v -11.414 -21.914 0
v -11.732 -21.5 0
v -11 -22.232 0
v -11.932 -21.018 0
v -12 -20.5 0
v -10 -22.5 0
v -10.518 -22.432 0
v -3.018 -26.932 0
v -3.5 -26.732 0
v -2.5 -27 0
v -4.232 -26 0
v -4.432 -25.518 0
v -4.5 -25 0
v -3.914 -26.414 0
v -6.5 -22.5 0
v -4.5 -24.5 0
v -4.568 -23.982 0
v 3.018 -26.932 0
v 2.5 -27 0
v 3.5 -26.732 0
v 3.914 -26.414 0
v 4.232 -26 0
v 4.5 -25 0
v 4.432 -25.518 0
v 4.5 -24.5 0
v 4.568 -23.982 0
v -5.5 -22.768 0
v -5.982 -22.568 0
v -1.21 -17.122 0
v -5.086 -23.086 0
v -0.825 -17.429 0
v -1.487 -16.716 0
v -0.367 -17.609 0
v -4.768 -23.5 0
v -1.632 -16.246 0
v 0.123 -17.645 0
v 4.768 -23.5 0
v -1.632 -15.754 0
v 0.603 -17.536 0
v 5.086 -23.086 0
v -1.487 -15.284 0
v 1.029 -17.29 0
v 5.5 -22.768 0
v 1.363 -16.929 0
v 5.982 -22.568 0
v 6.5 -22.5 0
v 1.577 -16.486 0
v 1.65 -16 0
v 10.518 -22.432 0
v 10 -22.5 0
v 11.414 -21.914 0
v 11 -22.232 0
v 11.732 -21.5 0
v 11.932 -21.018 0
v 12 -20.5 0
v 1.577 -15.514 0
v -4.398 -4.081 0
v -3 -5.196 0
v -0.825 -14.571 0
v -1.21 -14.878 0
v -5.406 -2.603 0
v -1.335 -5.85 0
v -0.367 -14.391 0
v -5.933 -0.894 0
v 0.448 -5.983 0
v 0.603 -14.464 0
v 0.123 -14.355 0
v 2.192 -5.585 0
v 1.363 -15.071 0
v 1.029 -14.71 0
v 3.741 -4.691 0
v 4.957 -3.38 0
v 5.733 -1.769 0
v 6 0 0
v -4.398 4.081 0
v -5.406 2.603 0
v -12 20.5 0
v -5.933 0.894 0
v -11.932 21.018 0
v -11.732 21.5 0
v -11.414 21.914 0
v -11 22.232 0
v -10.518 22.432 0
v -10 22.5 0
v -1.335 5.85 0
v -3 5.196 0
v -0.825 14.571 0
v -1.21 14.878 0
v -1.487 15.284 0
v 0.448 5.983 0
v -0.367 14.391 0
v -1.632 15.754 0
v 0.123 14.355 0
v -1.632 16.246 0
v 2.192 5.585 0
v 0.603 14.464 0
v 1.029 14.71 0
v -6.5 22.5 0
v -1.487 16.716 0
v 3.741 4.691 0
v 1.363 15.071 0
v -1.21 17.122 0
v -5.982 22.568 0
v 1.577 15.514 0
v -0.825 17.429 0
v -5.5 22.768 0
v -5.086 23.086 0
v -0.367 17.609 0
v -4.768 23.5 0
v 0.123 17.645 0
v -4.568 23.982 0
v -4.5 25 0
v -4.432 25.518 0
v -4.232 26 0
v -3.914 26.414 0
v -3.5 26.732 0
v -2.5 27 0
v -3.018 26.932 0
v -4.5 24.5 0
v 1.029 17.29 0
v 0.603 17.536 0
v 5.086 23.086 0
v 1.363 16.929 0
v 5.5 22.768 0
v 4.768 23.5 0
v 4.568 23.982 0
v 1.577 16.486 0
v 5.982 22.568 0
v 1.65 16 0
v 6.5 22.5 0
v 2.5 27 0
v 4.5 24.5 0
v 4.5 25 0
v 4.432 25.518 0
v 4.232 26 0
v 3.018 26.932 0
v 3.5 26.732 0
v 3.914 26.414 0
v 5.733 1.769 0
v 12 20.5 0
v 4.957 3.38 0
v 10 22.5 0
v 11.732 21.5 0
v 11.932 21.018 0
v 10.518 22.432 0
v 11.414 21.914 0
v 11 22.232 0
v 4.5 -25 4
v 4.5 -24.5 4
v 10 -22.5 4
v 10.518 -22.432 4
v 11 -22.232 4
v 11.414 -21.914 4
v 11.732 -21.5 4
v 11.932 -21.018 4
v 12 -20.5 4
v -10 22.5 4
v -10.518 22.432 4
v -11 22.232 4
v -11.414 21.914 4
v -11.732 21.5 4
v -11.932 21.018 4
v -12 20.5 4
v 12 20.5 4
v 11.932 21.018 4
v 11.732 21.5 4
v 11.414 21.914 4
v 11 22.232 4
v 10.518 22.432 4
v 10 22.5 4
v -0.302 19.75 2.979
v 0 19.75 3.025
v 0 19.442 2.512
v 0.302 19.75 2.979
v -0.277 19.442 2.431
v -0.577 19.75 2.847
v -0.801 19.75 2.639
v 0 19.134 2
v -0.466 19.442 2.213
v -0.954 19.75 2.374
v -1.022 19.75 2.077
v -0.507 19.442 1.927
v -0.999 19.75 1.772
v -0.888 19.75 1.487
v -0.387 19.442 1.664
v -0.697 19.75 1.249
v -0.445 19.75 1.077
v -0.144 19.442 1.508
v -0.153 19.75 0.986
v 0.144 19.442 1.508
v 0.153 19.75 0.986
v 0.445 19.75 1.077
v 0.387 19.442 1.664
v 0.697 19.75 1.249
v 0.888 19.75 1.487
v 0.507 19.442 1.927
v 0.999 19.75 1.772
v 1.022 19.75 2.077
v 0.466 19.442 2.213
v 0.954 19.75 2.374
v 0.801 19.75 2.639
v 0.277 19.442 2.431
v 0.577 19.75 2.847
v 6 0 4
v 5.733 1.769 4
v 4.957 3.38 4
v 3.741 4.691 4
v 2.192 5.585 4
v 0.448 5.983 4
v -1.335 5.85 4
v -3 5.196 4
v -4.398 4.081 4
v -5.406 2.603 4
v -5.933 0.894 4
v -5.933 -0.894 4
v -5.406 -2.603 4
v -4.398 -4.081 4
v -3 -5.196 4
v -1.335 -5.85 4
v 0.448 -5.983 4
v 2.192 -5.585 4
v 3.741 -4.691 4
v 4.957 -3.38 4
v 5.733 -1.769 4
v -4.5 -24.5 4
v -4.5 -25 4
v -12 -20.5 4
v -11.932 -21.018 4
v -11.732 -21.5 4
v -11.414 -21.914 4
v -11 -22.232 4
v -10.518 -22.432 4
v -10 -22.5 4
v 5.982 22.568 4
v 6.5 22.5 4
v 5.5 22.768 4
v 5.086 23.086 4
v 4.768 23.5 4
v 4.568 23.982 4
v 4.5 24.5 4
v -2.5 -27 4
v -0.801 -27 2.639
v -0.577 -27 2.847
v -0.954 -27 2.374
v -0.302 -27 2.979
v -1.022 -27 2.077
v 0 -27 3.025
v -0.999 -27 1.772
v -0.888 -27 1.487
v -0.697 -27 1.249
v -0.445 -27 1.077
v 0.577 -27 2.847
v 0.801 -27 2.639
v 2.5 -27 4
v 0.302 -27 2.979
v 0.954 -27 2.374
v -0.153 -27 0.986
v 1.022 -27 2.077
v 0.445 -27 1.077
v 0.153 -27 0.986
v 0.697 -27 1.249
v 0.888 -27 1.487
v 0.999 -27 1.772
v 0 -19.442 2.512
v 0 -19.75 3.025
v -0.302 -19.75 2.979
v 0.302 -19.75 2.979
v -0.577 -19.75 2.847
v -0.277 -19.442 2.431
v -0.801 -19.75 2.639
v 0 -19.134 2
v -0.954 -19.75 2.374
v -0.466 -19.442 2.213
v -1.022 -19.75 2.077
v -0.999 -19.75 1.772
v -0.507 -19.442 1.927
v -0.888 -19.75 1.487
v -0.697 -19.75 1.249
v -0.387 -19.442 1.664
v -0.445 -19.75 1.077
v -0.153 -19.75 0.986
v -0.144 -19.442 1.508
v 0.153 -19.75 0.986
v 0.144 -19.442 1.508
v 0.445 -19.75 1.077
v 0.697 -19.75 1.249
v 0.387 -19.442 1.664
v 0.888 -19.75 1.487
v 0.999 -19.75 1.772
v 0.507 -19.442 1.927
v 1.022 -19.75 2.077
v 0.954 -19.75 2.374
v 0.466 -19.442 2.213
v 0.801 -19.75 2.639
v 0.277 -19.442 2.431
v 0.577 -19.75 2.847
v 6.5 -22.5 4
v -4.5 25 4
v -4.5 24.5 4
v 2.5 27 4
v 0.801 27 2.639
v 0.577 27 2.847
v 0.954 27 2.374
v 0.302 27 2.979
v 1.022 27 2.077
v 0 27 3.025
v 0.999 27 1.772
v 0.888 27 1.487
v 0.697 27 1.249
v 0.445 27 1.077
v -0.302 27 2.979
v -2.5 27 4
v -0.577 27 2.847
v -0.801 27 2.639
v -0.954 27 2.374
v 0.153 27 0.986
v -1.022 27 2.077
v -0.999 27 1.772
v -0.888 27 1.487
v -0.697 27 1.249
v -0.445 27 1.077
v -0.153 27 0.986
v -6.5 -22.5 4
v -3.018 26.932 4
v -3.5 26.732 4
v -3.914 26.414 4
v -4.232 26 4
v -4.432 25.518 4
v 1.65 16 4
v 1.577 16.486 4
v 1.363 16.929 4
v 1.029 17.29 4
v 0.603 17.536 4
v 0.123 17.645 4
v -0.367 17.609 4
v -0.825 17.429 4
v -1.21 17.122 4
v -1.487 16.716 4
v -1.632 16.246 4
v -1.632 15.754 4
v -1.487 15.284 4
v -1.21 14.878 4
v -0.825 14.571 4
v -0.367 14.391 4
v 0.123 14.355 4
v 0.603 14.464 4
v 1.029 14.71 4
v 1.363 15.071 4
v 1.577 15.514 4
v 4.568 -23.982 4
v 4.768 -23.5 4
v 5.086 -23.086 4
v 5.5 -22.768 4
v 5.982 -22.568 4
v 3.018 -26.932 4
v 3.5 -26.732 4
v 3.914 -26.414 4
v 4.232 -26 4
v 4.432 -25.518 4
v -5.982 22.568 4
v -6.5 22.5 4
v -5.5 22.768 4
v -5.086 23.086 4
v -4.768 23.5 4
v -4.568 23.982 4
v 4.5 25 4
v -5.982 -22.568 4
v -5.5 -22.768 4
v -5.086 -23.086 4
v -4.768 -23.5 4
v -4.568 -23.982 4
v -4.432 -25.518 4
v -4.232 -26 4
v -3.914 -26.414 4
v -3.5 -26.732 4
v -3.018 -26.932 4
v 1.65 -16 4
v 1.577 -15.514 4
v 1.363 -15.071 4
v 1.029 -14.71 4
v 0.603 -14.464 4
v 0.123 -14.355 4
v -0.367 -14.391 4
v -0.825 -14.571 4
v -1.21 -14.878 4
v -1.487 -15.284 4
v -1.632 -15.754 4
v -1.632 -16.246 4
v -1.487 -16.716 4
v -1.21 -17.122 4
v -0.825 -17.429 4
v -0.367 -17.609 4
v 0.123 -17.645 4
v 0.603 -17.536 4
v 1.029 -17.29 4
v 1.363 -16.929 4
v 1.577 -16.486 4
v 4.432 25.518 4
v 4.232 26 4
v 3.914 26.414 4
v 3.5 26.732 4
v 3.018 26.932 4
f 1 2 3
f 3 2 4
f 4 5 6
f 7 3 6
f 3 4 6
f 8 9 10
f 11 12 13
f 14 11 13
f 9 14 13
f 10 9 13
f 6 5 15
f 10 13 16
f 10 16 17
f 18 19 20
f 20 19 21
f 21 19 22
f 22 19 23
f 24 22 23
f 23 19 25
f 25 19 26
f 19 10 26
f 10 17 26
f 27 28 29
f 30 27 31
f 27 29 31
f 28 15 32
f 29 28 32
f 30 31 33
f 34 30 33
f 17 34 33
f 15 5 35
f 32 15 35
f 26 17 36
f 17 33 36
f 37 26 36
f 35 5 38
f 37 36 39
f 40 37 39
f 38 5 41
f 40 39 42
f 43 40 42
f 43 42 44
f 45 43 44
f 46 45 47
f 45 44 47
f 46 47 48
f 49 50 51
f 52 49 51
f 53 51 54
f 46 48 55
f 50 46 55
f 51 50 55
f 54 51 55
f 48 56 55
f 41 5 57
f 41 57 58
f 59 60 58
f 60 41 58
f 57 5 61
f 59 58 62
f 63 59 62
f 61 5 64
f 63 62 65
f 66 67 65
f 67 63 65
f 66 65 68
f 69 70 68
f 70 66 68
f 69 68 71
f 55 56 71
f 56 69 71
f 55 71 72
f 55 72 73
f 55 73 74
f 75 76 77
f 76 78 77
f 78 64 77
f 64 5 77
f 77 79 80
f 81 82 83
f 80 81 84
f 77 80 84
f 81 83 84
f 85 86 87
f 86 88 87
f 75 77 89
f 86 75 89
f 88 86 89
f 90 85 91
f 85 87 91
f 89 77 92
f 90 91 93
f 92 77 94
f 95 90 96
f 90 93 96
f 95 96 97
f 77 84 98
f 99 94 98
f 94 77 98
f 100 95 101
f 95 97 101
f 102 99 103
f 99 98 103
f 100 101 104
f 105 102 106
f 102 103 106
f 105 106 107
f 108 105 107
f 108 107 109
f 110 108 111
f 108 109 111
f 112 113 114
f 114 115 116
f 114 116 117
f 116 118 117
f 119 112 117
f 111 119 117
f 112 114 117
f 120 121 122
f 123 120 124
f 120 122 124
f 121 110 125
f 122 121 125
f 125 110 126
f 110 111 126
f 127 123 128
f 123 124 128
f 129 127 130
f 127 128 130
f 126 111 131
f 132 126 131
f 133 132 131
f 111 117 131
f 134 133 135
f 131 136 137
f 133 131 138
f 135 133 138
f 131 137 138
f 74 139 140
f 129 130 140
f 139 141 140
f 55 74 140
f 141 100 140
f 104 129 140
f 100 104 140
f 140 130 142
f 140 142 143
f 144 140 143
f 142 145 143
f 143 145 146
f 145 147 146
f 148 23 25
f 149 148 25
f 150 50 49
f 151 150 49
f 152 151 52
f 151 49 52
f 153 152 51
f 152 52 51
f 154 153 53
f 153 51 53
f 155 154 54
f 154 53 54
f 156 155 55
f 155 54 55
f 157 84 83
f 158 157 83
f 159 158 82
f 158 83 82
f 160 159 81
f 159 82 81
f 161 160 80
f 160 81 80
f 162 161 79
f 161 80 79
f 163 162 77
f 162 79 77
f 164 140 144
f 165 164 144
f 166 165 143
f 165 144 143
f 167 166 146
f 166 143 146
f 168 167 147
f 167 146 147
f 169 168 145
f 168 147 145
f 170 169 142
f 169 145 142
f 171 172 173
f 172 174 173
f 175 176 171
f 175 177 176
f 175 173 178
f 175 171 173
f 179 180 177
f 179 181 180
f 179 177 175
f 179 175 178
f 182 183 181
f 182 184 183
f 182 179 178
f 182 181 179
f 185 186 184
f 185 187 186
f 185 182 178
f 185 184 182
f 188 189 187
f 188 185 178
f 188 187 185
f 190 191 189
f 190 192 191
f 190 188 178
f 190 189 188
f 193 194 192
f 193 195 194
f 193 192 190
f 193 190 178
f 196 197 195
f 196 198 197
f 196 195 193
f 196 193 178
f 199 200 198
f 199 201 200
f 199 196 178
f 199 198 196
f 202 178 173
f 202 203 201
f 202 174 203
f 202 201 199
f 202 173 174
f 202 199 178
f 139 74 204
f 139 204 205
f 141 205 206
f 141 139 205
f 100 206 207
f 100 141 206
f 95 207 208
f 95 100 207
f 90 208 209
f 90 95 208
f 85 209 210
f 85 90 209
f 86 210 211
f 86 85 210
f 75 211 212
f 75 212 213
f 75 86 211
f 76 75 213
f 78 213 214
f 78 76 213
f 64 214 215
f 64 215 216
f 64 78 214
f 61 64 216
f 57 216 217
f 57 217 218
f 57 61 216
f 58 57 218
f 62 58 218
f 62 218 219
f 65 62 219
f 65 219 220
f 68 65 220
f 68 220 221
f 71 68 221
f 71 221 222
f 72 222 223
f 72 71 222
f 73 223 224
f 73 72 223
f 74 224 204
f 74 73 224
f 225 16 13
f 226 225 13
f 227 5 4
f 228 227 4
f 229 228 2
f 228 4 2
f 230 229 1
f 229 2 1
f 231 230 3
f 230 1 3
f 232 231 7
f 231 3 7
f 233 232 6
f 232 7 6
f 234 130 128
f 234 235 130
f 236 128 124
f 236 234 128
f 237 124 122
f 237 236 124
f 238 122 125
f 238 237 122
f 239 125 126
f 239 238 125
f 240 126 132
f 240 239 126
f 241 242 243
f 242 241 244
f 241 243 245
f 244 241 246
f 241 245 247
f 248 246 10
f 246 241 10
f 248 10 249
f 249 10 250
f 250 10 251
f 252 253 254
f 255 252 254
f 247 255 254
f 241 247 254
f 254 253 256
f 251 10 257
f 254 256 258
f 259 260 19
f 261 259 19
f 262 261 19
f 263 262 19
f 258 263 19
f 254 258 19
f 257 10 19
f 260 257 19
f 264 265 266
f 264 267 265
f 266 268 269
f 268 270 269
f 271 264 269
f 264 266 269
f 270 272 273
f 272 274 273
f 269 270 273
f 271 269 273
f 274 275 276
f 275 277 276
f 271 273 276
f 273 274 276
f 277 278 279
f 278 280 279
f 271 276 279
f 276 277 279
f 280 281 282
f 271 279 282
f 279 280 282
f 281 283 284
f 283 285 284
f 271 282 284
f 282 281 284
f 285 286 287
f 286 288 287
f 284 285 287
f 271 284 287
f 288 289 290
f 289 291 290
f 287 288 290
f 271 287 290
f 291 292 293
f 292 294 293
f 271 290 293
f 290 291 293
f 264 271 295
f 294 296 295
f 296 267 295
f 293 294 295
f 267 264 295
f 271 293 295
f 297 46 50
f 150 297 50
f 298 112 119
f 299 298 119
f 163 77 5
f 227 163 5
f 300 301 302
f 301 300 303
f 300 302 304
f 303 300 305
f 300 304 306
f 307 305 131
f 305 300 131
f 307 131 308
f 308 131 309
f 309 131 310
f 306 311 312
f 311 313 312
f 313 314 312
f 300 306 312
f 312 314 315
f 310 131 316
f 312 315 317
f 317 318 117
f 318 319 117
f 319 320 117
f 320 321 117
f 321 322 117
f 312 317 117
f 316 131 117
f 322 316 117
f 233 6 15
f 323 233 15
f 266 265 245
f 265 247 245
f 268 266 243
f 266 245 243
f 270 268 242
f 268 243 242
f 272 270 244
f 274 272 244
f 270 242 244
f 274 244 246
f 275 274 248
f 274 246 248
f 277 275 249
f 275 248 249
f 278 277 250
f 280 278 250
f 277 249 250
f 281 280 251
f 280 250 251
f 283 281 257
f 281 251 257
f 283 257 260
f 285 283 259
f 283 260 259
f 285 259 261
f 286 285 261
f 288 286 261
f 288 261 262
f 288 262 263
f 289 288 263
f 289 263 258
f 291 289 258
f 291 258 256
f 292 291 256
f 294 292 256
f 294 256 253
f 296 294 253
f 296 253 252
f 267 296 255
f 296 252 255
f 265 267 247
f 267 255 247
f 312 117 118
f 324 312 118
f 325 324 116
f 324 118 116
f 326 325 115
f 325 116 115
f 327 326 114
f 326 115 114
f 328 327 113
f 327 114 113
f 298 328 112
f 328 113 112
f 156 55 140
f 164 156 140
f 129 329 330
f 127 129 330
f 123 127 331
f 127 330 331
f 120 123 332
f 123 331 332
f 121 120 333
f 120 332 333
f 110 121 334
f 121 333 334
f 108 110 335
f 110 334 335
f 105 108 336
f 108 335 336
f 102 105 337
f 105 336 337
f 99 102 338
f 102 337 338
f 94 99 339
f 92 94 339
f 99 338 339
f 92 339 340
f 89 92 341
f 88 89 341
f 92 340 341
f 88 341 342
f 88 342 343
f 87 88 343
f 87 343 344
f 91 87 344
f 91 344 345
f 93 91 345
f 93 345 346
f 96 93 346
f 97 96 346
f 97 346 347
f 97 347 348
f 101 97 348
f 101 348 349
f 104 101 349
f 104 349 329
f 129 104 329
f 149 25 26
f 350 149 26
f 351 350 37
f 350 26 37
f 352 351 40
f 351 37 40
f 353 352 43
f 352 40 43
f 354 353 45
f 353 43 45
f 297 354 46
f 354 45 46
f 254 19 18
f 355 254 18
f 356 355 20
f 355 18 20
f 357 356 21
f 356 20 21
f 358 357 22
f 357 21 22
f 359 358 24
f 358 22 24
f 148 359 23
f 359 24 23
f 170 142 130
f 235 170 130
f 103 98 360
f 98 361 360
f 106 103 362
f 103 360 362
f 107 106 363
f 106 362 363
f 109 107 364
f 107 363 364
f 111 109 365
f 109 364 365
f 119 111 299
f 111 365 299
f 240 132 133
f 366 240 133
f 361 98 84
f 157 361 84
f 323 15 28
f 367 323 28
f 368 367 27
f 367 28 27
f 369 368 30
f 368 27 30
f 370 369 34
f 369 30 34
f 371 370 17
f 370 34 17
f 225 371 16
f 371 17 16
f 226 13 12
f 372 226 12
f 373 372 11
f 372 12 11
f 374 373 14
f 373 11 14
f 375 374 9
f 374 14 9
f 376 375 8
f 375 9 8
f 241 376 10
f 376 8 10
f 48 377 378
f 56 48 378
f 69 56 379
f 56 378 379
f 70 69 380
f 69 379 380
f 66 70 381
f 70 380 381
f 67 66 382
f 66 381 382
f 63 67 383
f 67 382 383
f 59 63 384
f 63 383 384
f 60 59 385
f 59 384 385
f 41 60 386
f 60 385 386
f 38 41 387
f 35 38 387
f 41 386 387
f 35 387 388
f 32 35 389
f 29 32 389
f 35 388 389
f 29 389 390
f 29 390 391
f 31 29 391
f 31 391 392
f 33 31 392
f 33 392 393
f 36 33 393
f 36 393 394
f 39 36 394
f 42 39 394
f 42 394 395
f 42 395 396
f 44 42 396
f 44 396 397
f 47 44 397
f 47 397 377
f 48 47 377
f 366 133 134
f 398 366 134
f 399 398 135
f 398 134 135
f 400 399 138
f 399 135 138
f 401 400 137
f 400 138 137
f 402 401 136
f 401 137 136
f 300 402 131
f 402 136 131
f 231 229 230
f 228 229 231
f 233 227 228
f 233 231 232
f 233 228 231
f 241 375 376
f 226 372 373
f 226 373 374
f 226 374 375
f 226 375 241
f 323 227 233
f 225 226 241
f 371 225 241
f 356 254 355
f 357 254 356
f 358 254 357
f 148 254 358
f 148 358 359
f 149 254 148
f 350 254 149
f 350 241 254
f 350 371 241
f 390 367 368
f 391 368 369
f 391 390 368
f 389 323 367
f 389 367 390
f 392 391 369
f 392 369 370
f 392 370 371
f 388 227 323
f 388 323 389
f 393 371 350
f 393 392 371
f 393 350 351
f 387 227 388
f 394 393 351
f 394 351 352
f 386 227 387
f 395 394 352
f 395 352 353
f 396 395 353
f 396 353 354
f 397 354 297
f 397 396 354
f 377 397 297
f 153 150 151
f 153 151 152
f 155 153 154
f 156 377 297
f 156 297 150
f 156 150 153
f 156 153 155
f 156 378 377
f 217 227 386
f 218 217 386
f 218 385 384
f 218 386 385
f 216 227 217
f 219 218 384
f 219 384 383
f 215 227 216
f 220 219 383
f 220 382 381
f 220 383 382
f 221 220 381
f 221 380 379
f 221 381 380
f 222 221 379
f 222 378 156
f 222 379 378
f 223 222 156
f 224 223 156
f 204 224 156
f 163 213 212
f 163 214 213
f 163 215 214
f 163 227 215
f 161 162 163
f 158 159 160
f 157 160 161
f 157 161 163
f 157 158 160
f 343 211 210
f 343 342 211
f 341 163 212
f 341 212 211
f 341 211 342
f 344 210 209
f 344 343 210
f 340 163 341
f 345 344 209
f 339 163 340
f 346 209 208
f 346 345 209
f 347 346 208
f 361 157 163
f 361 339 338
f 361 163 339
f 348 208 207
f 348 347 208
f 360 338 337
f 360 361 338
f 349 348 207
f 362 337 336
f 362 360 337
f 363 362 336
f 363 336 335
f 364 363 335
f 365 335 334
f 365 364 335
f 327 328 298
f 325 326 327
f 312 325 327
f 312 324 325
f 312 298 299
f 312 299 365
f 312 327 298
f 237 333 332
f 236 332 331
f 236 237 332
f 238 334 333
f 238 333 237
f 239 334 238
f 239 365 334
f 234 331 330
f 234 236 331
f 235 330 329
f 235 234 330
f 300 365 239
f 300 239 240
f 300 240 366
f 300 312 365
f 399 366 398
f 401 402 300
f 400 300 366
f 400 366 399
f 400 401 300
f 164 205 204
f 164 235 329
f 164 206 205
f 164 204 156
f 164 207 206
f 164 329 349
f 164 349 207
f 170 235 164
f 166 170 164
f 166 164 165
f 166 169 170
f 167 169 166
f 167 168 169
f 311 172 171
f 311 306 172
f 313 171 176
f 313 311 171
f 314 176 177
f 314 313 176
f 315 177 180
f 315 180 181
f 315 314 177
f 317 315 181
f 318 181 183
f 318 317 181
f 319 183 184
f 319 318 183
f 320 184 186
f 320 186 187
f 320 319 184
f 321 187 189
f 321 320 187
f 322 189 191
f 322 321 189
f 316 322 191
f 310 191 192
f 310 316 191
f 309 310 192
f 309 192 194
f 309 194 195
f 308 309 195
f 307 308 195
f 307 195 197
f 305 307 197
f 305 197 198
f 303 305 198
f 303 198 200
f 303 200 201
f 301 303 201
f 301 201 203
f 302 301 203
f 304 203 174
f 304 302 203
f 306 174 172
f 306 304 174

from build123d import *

# Parameters (mm, degrees)
SKETCH_3_R             = 6
EXTRUDE_1_DEPTH        = 4
FILLET_1_R             = 2
HOLE_WIZARD_M4_2_D     = 3.3
HOLE_WIZARD_M4_2_DEPTH = 11.5
HOLE_WIZARD_M4_2_TIP   = 0.991420021


with BuildPart() as part:
    # 草图3 → 凸台-拉伸1 (new body)
    with BuildSketch(Plane.XY):
        with BuildLine():
            Line((-2.5, -27), (2.5, -27))
            ThreePointArc((2.5, -27), (3.914213562, -26.414213562), (4.5, -25))
            Line((4.5, -25), (4.5, -24.5))
            ThreePointArc((4.5, -24.5), (5.085786438, -23.085786438), (6.5, -22.5))
            Line((6.5, -22.5), (10, -22.5))
            ThreePointArc((10, -22.5), (11.414213562, -21.914213562), (12, -20.5))
            Line((12, -20.5), (12, 20.5))
            ThreePointArc((12, 20.5), (11.414213562, 21.914213562), (10, 22.5))
            Line((10, 22.5), (4.5, 22.5))
            Line((4.5, 22.5), (4.5, 25))
            ThreePointArc((4.5, 25), (3.914213562, 26.414213562), (2.5, 27))
            Line((2.5, 27), (-2.5, 27))
            ThreePointArc((-2.5, 27), (-3.914213562, 26.414213562), (-4.5, 25))
            Line((-4.5, 25), (-4.5, 22.5))
            Line((-4.5, 22.5), (-10, 22.5))
            ThreePointArc((-10, 22.5), (-11.414213562, 21.914213562), (-12, 20.5))
            Line((-12, 20.5), (-12, -20.5))
            ThreePointArc((-12, -20.5), (-11.414213562, -21.914213562), (-10, -22.5))
            Line((-10, -22.5), (-6.5, -22.5))
            ThreePointArc((-6.5, -22.5), (-5.085786438, -23.085786438), (-4.5, -24.5))
            Line((-4.5, -24.5), (-4.5, -25))
            ThreePointArc((-4.5, -25), (-3.914213562, -26.414213562), (-2.5, -27))
        make_face()
        Circle(SKETCH_3_R, mode=Mode.SUBTRACT)
    extrude(amount=EXTRUDE_1_DEPTH)

    # 草图6 → M2.5 螺纹孔1 (revolve, cut)
    with BuildSketch(Plane(origin=(0, 27, 2), x_dir=(0, 0, 1), z_dir=(1, 0, 0))):
        Polygon((0, 0), (0, 7.865882135), (1.025, 7.25), (1.025, 0), align=None)
    hole_wizard_m2_5_1 = revolve(axis=Axis((0, 33.35, 2), (0, -1, 0)), mode=Mode.SUBTRACT)

    # 镜向1: M2.5 螺纹孔1 across plane
    add(hole_wizard_m2_5_1.mirror(Plane.ZX), mode=Mode.SUBTRACT)

    # 圆角1
    fillet_1_edges = [part.edges().sort_by_distance(p)[0] for p in [
        (-4.5, 22.5, 2),
        (4.5, 22.5, 2),
    ]]
    fillet(fillet_1_edges, radius=FILLET_1_R)

    # M4 螺纹孔2
    with Locations(Plane(origin=(0, 0, 0), x_dir=(-1, 0, 0), z_dir=(0, 0, -1))):
        with Locations((0, 16), (0, -16)):
            Hole(HOLE_WIZARD_M4_2_D / 2, depth=HOLE_WIZARD_M4_2_DEPTH)
            with Locations((0, 0, -(HOLE_WIZARD_M4_2_DEPTH + HOLE_WIZARD_M4_2_TIP / 2))):  # 118° drill point
                Cone(0, HOLE_WIZARD_M4_2_D / 2, HOLE_WIZARD_M4_2_TIP, mode=Mode.SUBTRACT)


solid = part.part
